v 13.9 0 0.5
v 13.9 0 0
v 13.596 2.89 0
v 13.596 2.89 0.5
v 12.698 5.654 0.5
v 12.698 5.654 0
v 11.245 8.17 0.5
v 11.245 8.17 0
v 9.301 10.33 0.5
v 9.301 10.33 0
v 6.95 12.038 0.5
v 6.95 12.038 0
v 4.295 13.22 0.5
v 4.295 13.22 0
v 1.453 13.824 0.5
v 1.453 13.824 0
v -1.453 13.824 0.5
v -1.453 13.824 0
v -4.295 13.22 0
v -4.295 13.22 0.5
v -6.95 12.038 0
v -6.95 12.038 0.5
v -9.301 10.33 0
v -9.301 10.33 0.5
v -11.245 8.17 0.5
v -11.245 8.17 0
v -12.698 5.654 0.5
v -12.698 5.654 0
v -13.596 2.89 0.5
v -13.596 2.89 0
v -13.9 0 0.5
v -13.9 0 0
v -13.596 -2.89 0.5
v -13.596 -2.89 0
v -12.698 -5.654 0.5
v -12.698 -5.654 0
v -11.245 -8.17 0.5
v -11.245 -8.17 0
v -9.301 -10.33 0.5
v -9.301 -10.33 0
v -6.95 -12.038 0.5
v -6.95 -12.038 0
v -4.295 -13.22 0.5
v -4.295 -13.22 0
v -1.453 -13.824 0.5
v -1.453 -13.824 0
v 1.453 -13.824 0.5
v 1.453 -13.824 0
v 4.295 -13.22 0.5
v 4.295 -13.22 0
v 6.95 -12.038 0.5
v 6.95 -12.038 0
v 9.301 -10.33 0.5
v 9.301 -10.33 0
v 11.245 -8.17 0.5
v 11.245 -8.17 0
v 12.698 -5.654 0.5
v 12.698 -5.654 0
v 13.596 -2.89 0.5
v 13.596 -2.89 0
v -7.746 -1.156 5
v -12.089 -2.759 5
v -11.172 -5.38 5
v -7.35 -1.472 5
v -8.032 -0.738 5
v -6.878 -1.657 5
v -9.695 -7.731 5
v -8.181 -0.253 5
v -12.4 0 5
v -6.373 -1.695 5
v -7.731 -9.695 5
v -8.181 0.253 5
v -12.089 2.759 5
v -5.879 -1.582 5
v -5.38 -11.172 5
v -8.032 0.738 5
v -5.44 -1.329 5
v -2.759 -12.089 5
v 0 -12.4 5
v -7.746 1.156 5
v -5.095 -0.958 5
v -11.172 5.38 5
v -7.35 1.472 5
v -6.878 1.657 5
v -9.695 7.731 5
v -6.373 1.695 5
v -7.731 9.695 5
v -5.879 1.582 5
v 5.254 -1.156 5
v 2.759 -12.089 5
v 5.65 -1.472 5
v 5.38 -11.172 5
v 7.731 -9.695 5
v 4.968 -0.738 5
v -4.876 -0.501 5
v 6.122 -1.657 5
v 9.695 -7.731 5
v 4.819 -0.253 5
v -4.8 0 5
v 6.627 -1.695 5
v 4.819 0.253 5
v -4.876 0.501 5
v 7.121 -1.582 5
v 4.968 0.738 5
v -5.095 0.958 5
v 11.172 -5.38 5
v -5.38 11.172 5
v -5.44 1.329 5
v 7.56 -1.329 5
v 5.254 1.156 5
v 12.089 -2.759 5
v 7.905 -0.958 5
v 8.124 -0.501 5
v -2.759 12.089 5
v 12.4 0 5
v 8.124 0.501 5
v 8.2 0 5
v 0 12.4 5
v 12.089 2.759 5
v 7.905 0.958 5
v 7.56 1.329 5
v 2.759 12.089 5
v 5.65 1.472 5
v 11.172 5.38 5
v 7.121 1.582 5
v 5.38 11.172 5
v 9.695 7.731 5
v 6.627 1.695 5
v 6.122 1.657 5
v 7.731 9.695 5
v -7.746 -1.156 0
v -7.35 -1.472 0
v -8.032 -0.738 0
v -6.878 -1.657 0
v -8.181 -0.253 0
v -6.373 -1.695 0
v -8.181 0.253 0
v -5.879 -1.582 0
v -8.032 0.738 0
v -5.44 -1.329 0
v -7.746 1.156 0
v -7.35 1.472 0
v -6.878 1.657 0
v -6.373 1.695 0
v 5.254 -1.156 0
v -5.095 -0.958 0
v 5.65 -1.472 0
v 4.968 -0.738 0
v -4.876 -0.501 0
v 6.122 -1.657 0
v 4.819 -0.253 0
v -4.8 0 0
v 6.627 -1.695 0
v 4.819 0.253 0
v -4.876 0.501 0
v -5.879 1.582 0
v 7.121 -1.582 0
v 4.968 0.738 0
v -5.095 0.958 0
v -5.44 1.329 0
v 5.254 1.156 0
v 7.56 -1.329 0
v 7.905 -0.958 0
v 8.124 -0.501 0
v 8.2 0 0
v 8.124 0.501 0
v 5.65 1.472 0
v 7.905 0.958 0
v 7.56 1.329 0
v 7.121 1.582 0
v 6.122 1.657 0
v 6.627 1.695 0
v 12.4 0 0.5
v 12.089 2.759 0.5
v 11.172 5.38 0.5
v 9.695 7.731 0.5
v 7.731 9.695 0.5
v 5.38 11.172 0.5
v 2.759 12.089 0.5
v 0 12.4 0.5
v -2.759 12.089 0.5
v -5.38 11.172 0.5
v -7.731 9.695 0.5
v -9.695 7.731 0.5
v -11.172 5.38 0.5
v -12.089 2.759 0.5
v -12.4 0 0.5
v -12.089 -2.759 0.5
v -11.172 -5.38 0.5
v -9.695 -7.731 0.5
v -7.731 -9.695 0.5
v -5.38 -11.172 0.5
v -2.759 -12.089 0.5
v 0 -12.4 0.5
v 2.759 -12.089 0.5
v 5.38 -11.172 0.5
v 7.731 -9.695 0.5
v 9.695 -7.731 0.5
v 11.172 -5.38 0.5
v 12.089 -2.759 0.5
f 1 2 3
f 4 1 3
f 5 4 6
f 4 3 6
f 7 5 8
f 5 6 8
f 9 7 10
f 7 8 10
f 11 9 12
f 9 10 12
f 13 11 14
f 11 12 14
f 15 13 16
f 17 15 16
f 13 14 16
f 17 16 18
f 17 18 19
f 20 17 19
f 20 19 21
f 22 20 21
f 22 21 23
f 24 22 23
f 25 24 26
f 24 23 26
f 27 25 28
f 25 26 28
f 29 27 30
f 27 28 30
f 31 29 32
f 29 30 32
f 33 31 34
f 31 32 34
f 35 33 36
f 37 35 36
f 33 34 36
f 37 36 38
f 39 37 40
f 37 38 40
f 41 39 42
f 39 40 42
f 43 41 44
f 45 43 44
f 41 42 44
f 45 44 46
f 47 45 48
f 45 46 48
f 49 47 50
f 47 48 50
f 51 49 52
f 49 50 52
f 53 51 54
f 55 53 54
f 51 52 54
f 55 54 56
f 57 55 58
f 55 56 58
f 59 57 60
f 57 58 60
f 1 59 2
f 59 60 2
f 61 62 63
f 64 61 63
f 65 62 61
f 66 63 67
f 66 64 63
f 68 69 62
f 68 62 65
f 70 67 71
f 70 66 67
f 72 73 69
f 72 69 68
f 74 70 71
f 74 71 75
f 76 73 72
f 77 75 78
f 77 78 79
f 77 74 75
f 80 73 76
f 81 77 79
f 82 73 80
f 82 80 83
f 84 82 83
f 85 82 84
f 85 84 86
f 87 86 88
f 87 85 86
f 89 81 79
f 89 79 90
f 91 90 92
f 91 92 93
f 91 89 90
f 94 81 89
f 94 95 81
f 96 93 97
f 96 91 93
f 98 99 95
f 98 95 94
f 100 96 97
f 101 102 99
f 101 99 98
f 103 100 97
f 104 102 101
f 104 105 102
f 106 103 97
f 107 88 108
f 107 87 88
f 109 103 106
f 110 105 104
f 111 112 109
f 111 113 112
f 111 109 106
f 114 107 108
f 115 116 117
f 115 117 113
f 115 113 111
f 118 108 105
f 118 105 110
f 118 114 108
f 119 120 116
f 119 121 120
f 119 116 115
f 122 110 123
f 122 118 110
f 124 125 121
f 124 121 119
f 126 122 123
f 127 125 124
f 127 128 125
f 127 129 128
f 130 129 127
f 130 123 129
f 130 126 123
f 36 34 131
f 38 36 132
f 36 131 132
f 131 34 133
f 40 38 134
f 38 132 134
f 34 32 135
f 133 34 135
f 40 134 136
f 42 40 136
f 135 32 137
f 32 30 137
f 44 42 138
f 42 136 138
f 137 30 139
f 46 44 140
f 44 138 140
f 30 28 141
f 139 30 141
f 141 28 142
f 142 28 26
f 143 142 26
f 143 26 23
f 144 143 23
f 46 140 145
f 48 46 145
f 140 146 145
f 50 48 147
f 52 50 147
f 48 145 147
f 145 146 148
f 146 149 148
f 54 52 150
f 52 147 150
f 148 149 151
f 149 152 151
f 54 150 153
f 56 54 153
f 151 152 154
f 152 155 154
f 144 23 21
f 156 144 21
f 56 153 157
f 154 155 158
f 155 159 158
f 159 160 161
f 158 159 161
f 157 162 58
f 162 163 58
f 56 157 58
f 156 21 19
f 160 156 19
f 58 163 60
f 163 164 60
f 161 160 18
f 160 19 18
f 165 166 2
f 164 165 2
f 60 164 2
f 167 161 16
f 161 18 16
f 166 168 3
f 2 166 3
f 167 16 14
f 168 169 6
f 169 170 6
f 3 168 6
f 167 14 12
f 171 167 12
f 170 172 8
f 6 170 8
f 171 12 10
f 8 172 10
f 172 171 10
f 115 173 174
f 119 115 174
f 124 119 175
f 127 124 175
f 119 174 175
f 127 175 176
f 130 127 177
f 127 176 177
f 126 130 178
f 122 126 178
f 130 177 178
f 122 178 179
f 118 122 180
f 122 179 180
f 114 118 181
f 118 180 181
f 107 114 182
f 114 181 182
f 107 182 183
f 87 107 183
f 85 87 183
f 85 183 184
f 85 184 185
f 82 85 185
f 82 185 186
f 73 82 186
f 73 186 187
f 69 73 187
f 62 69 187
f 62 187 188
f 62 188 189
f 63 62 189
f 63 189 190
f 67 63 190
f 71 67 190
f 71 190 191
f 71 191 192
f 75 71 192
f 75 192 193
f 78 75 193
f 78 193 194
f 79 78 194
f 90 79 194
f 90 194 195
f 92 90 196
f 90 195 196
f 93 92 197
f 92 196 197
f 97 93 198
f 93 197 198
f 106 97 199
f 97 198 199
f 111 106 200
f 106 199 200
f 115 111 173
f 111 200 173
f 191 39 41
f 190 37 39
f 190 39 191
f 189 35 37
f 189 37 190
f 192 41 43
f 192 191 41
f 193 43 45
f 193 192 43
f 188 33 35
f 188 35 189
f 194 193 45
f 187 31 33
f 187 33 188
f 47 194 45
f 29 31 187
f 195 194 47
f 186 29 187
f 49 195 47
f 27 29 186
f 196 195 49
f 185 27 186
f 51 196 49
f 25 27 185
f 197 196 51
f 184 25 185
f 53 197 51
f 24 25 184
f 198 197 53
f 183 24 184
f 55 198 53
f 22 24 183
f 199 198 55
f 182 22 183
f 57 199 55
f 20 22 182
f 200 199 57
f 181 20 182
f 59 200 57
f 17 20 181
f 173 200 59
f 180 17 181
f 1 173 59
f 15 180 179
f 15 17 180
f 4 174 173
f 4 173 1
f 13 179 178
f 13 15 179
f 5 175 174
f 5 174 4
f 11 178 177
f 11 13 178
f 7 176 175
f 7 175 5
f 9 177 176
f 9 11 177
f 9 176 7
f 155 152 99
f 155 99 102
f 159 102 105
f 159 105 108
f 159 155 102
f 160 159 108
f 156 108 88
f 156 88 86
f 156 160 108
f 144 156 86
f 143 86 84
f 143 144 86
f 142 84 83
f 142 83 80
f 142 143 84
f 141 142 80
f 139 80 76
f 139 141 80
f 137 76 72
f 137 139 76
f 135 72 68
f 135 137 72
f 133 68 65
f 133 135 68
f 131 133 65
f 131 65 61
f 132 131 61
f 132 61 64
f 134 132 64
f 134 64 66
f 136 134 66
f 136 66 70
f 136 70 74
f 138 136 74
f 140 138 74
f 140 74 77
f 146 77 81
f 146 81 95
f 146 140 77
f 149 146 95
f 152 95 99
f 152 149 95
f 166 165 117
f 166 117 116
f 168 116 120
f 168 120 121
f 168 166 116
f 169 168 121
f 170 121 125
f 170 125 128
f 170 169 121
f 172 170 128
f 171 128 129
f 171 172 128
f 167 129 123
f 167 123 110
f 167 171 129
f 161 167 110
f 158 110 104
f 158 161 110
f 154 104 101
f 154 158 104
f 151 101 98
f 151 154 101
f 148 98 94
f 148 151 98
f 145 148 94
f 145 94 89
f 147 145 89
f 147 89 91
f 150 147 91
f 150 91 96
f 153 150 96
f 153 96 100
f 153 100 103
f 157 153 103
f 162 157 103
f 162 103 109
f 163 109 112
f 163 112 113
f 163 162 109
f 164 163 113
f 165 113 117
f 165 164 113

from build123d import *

# Parameters (mm, degrees)
SKETCH_1_R      = 12.4
SKETCH_1_R_2    = 1.7
EXTRUDE_1_DEPTH = 5
SKETCH_2_R      = 13.9
SKETCH_2_R_2    = 12.4
EXTRUDE_2_DEPTH = 0.5


with BuildPart() as part:
    # 草图1 → 凸台-拉伸1 (new body)
    with BuildSketch(Plane.XY):
        Circle(SKETCH_1_R)
        with Locations((-6.5, 0)):
            Circle(SKETCH_1_R_2, mode=Mode.SUBTRACT)
        with Locations((6.5, 0)):
            Circle(SKETCH_1_R_2, mode=Mode.SUBTRACT)
    extrude(amount=EXTRUDE_1_DEPTH)

    # 草图2 → 凸台-拉伸2 (add)
    with BuildSketch(Plane.XY):
        Circle(SKETCH_2_R)
        Circle(SKETCH_2_R_2, mode=Mode.SUBTRACT)
    extrude(amount=EXTRUDE_2_DEPTH)


solid = part.part
